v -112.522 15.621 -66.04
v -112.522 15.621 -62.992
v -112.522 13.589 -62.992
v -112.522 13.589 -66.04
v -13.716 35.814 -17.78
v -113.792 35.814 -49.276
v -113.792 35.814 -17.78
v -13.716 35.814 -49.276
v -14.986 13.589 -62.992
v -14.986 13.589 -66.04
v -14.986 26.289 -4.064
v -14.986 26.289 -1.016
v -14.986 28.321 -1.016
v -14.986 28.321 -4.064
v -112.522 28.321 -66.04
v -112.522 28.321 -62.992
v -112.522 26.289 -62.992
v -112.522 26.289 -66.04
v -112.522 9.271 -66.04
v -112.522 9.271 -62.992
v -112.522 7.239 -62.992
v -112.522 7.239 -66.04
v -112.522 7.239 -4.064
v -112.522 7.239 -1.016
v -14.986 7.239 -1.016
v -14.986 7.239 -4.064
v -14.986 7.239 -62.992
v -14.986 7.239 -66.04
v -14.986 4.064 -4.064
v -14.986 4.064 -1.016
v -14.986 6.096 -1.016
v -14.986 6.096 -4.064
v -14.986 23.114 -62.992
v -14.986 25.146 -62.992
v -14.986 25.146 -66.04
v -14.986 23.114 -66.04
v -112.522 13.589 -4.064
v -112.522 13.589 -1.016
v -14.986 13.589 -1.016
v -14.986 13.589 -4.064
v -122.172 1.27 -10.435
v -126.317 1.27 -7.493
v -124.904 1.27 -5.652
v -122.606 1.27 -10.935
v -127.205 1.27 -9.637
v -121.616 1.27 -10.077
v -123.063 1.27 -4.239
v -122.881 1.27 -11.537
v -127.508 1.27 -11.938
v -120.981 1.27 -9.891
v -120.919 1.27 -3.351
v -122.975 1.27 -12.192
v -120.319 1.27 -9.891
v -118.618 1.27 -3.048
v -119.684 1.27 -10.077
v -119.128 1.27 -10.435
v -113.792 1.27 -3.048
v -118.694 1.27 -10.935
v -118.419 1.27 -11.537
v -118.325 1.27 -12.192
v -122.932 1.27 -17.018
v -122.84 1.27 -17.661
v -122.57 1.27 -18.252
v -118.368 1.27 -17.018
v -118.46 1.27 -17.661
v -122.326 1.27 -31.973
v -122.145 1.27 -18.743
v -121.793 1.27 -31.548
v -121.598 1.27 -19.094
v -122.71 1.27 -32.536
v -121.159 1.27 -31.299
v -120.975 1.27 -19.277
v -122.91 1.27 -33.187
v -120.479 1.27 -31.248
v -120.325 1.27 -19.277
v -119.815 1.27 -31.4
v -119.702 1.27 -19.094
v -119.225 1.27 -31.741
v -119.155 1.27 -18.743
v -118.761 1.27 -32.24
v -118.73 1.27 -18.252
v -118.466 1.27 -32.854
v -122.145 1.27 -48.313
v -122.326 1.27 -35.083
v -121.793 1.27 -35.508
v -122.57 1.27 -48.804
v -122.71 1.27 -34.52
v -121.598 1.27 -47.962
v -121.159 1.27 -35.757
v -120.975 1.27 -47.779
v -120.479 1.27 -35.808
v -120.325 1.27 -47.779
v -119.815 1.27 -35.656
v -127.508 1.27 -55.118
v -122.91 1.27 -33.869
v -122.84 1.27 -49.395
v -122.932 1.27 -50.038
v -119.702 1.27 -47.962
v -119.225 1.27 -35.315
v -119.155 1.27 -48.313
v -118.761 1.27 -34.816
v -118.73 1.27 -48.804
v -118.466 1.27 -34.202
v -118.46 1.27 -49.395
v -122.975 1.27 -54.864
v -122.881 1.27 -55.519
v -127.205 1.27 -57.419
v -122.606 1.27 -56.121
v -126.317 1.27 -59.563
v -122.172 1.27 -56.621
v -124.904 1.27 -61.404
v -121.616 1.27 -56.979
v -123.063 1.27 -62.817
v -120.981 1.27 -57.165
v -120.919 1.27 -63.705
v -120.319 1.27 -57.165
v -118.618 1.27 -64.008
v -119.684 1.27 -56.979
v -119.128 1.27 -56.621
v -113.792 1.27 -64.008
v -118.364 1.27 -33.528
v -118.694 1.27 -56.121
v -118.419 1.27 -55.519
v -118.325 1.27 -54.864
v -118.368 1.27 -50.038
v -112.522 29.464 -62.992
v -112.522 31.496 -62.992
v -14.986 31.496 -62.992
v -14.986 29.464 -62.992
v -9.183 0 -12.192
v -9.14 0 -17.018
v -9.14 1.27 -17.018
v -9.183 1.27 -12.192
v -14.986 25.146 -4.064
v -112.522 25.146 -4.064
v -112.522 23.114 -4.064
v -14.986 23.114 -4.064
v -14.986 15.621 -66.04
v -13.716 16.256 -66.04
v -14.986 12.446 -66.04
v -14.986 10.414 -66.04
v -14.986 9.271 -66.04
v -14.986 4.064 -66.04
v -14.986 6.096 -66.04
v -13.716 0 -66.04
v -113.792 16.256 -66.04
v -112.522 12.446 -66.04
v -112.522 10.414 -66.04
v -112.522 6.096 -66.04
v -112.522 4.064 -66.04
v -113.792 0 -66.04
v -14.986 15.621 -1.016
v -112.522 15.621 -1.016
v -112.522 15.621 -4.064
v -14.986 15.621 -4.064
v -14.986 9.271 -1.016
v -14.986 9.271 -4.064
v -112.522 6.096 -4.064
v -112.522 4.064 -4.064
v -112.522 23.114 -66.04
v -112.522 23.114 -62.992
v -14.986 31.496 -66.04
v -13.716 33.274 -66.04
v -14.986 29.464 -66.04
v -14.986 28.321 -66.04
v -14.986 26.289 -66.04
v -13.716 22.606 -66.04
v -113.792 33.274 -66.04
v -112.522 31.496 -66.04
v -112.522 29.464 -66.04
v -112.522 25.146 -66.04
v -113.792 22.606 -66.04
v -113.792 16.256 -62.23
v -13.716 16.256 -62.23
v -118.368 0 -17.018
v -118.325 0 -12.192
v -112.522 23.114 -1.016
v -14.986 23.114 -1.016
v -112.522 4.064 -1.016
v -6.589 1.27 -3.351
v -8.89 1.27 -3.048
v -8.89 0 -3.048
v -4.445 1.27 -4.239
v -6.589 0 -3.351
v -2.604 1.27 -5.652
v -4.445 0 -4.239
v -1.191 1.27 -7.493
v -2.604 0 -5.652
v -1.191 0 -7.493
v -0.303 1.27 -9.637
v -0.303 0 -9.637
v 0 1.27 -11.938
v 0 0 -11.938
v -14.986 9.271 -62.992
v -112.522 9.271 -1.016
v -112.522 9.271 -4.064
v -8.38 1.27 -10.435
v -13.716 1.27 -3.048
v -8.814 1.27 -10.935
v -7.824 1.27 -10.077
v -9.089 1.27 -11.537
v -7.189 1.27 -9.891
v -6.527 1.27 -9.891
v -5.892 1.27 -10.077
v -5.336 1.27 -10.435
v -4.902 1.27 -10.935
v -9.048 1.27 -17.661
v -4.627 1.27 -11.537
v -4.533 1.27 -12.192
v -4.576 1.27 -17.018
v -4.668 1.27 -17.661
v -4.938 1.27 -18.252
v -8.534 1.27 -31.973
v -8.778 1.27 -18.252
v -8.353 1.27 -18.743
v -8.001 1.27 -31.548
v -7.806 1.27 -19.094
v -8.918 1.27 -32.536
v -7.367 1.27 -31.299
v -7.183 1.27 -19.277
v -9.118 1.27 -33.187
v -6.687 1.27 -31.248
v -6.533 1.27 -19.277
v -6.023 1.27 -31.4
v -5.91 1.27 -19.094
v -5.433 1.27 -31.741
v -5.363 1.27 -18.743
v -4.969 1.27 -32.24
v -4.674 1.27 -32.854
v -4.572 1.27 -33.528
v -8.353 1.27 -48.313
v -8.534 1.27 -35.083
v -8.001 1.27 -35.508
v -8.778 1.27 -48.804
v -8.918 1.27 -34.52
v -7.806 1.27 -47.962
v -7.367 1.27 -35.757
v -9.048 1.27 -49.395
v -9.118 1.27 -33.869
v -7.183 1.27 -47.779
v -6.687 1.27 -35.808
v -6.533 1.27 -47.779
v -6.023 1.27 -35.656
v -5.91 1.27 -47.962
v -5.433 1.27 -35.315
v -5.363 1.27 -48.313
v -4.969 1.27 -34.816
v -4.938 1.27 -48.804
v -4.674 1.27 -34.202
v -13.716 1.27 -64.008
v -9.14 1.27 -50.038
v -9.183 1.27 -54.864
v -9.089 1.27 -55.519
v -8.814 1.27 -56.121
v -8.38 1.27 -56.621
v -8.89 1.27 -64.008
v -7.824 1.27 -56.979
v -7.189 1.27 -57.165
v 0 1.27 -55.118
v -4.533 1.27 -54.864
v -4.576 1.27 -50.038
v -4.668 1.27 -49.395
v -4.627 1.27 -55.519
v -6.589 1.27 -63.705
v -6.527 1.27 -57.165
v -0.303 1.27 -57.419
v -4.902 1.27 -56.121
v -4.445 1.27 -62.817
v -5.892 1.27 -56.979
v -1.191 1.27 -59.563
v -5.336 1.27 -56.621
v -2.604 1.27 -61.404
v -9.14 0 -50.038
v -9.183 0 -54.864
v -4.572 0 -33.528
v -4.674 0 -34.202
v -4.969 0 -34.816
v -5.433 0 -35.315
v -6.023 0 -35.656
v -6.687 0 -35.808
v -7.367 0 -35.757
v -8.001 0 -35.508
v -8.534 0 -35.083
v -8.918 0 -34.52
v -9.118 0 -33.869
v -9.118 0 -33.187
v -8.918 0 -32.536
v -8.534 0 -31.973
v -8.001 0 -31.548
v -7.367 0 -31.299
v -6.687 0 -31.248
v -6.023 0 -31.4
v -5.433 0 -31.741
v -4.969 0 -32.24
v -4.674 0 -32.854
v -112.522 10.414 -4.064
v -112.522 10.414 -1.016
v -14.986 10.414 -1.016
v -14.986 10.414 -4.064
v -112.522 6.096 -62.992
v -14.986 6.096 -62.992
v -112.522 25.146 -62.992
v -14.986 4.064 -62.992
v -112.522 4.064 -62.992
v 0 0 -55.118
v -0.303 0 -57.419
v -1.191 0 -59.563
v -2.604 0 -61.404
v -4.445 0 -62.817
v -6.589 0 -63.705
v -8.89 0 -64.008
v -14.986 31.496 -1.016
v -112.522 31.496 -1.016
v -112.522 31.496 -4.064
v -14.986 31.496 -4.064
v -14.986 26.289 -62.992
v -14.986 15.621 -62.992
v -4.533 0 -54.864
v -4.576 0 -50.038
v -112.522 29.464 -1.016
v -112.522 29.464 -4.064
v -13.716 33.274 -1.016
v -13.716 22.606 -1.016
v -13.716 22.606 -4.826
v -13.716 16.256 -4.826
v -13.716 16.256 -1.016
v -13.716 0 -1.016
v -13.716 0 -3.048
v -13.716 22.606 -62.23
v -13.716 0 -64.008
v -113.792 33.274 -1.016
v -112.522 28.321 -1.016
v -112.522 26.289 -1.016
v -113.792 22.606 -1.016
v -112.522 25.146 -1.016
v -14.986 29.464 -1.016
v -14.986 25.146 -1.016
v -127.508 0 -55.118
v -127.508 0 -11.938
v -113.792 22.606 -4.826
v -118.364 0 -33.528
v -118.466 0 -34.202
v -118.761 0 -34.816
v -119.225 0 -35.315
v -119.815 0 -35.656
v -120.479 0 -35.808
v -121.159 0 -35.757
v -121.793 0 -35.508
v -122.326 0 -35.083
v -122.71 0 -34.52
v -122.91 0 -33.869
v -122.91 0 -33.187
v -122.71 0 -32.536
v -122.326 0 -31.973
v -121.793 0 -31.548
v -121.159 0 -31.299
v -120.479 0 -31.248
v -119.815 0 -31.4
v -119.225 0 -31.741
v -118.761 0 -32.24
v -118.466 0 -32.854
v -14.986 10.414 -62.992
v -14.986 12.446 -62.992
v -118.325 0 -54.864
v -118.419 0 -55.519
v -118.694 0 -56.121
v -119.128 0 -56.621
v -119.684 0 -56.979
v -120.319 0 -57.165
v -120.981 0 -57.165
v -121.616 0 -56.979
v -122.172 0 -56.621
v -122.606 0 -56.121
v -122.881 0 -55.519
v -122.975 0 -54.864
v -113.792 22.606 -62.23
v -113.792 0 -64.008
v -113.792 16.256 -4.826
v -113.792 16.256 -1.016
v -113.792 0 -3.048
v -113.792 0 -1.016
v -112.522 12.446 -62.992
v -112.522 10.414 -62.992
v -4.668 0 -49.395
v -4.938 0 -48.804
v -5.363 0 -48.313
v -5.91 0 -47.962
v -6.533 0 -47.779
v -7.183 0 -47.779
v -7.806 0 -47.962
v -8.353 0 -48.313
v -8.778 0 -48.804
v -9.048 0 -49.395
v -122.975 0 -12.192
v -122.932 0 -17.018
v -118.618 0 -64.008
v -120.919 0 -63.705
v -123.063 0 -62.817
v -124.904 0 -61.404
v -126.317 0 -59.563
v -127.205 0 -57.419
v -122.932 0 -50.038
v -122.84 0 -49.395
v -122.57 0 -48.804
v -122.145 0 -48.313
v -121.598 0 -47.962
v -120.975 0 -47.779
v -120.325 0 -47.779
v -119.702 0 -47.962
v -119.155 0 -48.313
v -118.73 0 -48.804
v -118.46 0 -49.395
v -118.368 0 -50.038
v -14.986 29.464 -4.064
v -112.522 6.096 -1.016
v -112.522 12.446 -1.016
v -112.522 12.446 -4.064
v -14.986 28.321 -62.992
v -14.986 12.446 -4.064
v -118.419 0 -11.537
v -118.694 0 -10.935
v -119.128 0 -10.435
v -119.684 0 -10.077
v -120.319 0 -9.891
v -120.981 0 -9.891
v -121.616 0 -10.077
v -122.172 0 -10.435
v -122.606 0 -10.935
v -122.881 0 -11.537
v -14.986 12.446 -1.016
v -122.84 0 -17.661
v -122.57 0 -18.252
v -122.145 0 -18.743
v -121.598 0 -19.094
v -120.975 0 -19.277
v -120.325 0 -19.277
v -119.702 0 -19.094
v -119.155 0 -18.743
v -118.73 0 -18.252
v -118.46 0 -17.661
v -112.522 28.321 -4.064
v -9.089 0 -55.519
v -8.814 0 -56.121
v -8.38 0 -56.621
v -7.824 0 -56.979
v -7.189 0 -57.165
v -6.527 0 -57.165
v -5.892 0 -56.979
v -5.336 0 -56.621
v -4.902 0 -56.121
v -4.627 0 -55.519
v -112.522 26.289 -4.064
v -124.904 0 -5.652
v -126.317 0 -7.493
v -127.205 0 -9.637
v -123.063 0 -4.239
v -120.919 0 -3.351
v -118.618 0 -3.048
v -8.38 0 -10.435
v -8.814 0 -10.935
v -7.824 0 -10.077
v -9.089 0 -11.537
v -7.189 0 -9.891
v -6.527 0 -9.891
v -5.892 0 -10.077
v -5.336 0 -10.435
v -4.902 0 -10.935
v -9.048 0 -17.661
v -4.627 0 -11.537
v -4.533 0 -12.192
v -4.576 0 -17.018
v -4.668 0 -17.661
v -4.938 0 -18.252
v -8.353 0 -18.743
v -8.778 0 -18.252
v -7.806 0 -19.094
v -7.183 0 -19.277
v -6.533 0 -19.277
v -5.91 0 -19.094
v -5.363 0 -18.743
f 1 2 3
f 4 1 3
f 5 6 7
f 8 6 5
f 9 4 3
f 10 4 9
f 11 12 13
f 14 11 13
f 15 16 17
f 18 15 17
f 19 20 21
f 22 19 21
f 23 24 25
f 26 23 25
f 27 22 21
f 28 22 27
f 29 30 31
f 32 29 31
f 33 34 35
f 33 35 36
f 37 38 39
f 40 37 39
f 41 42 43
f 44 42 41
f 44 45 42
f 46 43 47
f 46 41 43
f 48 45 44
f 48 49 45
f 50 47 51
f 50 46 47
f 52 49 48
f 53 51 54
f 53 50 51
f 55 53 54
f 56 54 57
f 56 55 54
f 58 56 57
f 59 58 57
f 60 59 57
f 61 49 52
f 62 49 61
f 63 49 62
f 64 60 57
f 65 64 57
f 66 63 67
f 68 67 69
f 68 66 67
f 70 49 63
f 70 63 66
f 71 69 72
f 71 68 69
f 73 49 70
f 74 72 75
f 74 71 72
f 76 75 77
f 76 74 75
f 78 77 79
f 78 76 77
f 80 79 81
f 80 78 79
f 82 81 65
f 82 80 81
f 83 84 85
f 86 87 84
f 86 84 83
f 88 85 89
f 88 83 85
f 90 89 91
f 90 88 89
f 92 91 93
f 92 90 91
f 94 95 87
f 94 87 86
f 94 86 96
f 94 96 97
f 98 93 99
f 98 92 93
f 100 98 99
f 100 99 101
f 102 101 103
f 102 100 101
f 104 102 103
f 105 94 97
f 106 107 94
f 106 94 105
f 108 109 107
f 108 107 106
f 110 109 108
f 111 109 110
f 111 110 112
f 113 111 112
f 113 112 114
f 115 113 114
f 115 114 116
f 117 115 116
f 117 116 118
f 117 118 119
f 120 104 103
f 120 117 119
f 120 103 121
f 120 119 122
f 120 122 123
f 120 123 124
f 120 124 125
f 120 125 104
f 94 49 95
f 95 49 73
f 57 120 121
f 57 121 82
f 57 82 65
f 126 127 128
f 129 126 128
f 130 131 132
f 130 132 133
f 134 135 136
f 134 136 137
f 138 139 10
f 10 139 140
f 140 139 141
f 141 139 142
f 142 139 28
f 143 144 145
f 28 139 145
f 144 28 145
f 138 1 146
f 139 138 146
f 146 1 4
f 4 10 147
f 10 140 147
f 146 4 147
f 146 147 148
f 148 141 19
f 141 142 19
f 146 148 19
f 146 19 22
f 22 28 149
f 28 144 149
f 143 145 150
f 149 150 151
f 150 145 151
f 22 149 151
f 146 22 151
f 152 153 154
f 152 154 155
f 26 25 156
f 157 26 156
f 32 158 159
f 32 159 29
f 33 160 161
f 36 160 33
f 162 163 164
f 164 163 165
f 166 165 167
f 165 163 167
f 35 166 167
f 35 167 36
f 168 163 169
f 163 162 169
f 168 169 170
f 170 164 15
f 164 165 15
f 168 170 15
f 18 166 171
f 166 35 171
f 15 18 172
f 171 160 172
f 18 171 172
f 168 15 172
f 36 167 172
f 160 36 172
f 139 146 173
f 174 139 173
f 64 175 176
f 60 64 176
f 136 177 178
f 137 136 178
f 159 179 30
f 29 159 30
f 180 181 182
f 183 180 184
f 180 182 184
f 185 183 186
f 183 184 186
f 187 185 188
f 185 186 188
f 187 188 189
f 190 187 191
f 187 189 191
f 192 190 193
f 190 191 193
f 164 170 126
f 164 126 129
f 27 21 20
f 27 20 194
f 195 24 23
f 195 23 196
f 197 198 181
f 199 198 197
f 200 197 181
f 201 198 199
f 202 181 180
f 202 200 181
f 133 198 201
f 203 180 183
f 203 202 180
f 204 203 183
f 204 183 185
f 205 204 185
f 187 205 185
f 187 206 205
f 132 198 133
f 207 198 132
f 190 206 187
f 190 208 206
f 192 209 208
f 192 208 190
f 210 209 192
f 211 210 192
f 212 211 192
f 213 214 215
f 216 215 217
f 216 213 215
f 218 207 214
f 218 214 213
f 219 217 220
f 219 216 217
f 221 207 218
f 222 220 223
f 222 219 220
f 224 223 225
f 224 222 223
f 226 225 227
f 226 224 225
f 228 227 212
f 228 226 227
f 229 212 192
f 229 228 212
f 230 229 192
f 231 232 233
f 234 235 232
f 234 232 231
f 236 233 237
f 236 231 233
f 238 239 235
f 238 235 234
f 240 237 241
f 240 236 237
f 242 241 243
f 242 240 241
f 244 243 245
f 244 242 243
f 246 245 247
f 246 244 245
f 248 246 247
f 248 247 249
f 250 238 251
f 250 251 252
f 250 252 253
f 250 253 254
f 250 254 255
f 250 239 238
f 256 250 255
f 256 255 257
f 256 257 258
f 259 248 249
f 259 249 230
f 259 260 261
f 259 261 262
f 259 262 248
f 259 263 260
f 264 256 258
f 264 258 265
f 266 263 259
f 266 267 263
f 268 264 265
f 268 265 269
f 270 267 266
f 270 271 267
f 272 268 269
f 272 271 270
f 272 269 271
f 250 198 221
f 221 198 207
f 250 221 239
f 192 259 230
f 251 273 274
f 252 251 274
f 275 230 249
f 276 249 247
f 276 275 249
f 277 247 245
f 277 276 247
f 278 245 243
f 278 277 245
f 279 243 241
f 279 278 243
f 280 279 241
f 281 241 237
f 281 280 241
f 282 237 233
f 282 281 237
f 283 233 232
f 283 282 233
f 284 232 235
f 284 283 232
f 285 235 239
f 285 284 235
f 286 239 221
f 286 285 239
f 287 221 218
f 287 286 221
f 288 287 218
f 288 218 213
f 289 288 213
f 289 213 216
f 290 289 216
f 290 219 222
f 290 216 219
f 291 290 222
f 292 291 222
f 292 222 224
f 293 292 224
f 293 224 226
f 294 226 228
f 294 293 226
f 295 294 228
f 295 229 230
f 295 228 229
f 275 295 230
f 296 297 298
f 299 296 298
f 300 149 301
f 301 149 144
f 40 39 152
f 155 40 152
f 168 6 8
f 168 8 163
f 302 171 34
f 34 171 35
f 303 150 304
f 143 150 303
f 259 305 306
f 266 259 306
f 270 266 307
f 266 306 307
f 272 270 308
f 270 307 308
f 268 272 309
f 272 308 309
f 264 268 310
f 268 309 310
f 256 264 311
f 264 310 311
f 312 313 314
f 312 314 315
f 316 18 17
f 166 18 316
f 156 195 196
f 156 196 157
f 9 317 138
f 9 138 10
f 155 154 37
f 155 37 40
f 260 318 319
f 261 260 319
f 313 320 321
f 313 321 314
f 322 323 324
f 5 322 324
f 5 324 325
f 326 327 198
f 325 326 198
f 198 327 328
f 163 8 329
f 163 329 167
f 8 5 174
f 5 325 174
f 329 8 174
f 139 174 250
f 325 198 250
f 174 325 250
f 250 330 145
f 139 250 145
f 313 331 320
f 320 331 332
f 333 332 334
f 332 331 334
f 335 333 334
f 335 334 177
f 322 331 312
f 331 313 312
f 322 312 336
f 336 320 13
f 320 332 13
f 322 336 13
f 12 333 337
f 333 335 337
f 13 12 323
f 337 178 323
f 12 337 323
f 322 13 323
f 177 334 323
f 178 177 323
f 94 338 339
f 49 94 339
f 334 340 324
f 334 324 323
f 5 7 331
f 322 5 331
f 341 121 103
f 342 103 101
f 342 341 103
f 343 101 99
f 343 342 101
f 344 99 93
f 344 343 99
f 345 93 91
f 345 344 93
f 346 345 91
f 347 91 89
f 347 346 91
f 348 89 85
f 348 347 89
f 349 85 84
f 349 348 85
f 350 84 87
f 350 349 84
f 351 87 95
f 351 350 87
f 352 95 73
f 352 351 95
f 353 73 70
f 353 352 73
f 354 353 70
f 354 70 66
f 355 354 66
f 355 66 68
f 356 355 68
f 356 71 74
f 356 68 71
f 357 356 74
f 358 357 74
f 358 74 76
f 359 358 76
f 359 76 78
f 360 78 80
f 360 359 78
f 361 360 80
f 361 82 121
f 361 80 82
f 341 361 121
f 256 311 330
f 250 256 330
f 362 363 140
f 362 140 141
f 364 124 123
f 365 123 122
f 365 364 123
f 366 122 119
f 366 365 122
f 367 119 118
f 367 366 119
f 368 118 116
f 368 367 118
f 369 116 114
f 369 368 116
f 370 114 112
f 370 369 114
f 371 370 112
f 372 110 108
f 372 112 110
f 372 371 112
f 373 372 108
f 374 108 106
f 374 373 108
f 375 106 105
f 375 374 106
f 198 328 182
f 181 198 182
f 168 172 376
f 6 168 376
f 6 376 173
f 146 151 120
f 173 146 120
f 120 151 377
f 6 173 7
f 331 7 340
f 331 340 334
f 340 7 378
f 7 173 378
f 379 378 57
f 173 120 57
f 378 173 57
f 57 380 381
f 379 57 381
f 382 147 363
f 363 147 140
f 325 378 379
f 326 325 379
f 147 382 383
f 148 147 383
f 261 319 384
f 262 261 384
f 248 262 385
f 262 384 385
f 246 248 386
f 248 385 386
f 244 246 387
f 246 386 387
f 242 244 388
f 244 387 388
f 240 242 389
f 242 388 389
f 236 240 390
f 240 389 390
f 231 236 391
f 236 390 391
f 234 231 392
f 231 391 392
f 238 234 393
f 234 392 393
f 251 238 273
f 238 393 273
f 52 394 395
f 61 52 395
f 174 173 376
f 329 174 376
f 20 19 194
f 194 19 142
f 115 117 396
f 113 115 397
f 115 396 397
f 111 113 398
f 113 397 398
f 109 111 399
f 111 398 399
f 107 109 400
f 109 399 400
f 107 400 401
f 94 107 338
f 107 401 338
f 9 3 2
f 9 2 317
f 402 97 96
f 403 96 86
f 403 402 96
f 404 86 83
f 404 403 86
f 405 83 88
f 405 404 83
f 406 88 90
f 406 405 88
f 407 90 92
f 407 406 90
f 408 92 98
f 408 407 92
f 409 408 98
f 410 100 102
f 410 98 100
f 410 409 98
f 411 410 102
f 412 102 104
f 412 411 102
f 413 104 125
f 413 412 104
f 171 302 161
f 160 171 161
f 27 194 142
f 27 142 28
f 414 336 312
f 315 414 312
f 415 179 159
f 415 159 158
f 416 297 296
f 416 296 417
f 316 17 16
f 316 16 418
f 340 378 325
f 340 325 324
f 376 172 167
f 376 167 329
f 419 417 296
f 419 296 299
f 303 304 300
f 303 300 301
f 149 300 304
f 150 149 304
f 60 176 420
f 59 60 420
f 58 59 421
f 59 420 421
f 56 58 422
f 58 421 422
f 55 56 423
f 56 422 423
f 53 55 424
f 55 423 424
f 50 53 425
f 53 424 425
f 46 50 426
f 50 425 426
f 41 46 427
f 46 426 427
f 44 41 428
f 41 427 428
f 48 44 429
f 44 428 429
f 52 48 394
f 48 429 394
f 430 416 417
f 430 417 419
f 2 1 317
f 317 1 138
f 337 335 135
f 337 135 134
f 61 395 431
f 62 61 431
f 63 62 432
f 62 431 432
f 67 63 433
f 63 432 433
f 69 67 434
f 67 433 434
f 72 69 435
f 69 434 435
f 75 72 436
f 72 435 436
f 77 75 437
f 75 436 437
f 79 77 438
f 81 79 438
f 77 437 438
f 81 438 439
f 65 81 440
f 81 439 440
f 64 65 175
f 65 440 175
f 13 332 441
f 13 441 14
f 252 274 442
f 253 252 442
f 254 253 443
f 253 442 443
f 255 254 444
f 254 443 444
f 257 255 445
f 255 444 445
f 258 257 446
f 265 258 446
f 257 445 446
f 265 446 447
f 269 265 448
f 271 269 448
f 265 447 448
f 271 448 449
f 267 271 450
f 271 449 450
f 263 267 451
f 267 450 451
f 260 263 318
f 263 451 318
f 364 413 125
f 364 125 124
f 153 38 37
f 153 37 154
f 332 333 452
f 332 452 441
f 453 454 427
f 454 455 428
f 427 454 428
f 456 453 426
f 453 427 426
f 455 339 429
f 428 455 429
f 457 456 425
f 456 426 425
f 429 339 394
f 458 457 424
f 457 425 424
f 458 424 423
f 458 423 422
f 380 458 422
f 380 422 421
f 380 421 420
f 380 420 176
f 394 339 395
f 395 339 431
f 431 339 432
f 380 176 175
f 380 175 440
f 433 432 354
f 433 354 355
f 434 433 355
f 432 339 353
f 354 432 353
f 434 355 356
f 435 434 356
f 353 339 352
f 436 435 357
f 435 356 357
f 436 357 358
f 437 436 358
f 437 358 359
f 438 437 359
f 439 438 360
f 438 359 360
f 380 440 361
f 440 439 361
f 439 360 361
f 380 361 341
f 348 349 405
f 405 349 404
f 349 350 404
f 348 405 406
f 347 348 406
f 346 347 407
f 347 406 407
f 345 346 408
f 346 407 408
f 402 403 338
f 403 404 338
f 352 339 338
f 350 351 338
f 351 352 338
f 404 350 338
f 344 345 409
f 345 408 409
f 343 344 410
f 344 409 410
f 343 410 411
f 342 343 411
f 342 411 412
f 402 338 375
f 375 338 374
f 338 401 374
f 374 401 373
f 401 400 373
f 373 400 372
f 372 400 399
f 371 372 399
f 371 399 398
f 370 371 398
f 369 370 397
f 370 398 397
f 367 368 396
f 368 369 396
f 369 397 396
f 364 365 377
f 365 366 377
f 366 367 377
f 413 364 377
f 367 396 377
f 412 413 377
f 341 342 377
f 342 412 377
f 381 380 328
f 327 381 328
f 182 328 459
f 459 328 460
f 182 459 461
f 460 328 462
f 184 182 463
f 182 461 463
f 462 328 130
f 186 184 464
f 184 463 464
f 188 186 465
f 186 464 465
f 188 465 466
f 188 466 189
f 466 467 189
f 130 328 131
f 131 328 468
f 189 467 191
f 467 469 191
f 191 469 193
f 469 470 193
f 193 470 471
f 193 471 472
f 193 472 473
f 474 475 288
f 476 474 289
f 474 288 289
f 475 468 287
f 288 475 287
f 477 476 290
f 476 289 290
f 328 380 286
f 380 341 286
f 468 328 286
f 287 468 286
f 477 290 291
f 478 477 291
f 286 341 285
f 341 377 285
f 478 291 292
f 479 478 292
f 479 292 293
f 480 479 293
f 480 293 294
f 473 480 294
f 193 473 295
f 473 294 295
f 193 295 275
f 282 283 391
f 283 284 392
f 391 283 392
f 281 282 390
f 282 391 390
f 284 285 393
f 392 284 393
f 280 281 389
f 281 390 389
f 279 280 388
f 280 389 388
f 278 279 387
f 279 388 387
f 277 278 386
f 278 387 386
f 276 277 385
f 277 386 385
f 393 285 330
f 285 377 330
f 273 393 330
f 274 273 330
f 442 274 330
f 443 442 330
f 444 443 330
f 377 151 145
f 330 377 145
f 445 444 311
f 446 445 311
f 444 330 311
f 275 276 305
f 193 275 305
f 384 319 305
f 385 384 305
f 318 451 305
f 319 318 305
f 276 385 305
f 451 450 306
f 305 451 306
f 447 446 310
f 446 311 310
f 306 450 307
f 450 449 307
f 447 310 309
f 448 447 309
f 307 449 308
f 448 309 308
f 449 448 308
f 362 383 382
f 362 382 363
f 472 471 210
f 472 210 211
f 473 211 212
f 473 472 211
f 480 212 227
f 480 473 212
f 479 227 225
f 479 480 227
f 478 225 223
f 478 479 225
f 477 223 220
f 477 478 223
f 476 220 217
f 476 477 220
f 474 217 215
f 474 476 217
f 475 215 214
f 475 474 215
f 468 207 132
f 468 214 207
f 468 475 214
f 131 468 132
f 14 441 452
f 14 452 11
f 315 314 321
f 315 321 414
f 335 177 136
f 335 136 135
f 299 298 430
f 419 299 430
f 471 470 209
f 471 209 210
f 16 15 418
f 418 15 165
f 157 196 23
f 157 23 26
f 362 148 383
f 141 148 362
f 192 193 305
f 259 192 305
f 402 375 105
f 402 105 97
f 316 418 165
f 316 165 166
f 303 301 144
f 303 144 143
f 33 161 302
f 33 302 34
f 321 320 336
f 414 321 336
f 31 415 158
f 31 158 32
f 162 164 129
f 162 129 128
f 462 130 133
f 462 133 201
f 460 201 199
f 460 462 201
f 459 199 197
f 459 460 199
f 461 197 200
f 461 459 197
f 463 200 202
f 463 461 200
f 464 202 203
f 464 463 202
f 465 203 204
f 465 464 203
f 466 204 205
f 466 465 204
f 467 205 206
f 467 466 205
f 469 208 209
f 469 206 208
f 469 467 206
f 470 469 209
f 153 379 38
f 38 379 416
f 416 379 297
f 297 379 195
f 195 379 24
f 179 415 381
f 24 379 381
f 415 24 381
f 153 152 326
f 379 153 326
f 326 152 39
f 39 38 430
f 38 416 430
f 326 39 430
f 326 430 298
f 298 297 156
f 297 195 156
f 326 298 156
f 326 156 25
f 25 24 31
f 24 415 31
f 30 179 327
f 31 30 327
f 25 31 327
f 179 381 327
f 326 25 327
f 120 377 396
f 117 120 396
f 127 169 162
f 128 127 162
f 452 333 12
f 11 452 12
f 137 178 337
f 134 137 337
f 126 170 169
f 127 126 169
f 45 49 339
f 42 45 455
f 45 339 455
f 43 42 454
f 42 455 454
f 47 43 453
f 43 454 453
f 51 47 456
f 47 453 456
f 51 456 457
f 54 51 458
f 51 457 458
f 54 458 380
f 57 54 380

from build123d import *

# Parameters (mm, degrees)
SKETCH1_R               = 2.286
BOSS_EXTRUDE1_DEPTH     = 35.814
SKETCH3_W               = 13.716
SKETCH3_H               = 60.96
CUT_EXTRUDE2_DEPTH      = 34.544
SKETCH4_W               = 3.81
SKETCH4_H               = 6.35
CUT_EXTRUDE3_DEPTH      = 114.792
SKETCH5_W               = 97.536
SKETCH5_H               = 2.032
CUT_EXTRUDE6_DEPTH      = 3.048
LPATTERN1_COUNT         = 9
LPATTERN1_PITCH         = 3.175
MIRROR1_COPY_1_SKETCH_W = 97.536
MIRROR1_COPY_1_SKETCH_H = 2.032
MIRROR1_COPY_1_DEPTH    = 3.048
MIRROR1_COPY_2_SKETCH_W = 97.536
MIRROR1_COPY_2_SKETCH_H = 2.032
MIRROR1_COPY_2_DEPTH    = 3.048
MIRROR1_COPY_3_SKETCH_W = 97.536
MIRROR1_COPY_3_SKETCH_H = 2.032
MIRROR1_COPY_3_DEPTH    = 3.048
MIRROR1_COPY_4_SKETCH_W = 97.536
MIRROR1_COPY_4_SKETCH_H = 2.032
MIRROR1_COPY_4_DEPTH    = 3.048
MIRROR1_COPY_5_SKETCH_W = 97.536
MIRROR1_COPY_5_SKETCH_H = 2.032
MIRROR1_COPY_5_DEPTH    = 3.048
MIRROR1_COPY_6_SKETCH_W = 97.536
MIRROR1_COPY_6_SKETCH_H = 2.032
MIRROR1_COPY_6_DEPTH    = 3.048


with BuildPart() as part:
    # Sketch1 → Boss-Extrude1 (new body)
    with BuildSketch(Plane(origin=(0, 0, 0), x_dir=(1, 0, 0), z_dir=(0, 1, 0))):
        with BuildLine():
            Line((0, 11.938), (0, 55.118))
            ThreePointArc((0, 55.118), (-2.603820715, 61.404179285), (-8.89, 64.008))
            Line((-8.89, 64.008), (-13.716, 64.008))
            Line((-13.716, 64.008), (-13.716, 66.04))
            Line((-13.716, 66.04), (-113.792, 66.04))
            Line((-113.792, 66.04), (-113.792, 64.008))
            Line((-113.792, 64.008), (-118.618, 64.008))
            ThreePointArc((-118.618, 64.008), (-124.904179285, 61.404179285), (-127.508, 55.118))
            Line((-127.508, 55.118), (-127.508, 11.938))
            ThreePointArc((-127.508, 11.938), (-124.904179285, 5.651820715), (-118.618, 3.048))
            Line((-118.618, 3.048), (-113.792, 3.048))
            Line((-113.792, 3.048), (-113.792, 1.016))
            Line((-113.792, 1.016), (-13.716, 1.016))
            Line((-13.716, 1.016), (-13.716, 3.048))
            Line((-13.716, 3.048), (-8.89, 3.048))
            ThreePointArc((-8.89, 3.048), (-2.603820715, 5.651820715), (0, 11.938))
        make_face()
        with Locations((-120.65, 33.528)):
            Circle(SKETCH1_R, mode=Mode.SUBTRACT)
        with Locations((-6.858, 33.528)):
            Circle(SKETCH1_R, mode=Mode.SUBTRACT)
        with BuildLine():
            Line((-118.367709413, 17.018), (-118.325280939, 12.192))
            ThreePointArc((-118.325280939, 12.192), (-120.65, 9.867280939), (-122.974719061, 12.192))
            Line((-122.974719061, 12.192), (-122.932290587, 17.018))
            ThreePointArc((-122.932290587, 17.018), (-120.65, 19.300290587), (-118.367709413, 17.018))
        make_face(mode=Mode.SUBTRACT)
        with BuildLine():
            Line((-122.974719061, 54.864), (-122.932290587, 50.038))
            ThreePointArc((-122.932290587, 50.038), (-120.65, 47.755709413), (-118.367709413, 50.038))
            Line((-118.367709413, 50.038), (-118.325280939, 54.864))
            ThreePointArc((-118.325280939, 54.864), (-120.65, 57.188719061), (-122.974719061, 54.864))
        make_face(mode=Mode.SUBTRACT)
        with BuildLine():
            Line((-9.140290587, 50.038), (-9.182719061, 54.864))
            ThreePointArc((-9.182719061, 54.864), (-6.858, 57.188719061), (-4.533280939, 54.864))
            Line((-4.533280939, 54.864), (-4.575709413, 50.038))
            ThreePointArc((-4.575709413, 50.038), (-6.858, 47.755709413), (-9.140290587, 50.038))
        make_face(mode=Mode.SUBTRACT)
        with BuildLine():
            Line((-4.533280939, 12.192), (-4.575709413, 17.018))
            ThreePointArc((-4.575709413, 17.018), (-6.858, 19.300290587), (-9.140290587, 17.018))
            Line((-9.140290587, 17.018), (-9.182719061, 12.192))
            ThreePointArc((-9.182719061, 12.192), (-6.858, 9.867280939), (-4.533280939, 12.192))
        make_face(mode=Mode.SUBTRACT)
    extrude(amount=BOSS_EXTRUDE1_DEPTH)

    # Sketch3 → Cut-Extrude2 (cut)
    with BuildSketch(Plane(origin=(0, 35.814, 0), x_dir=(1, 0, 0), z_dir=(0, 1, 0))):
        with Locations((-6.858, 33.528)):
            Rectangle(SKETCH3_W, SKETCH3_H)
        with Locations((-120.65, 33.528)):
            Rectangle(SKETCH3_W, SKETCH3_H)
    extrude(amount=-CUT_EXTRUDE2_DEPTH, mode=Mode.SUBTRACT)

    # Sketch4 → Cut-Extrude3 (cut, through all)
    with BuildSketch(Plane.ZY.offset(113.792)):
        Polygon((-17.78, 35.814), (-1.016, 33.274), (-1.016, 35.814), align=None)
        with Locations((-64.135, 19.431)):
            Rectangle(SKETCH4_W, SKETCH4_H)
        with Locations((-2.921, 19.431)):
            Rectangle(SKETCH4_W, SKETCH4_H)
        Polygon((-66.04, 33.274), (-66.04, 35.814), (-49.276, 35.814), align=None)
    extrude(amount=-CUT_EXTRUDE3_DEPTH, mode=Mode.SUBTRACT)

    # Sketch5 → Cut-Extrude6 (cut)
    with BuildSketch(Plane.XY.offset(-1.016)):
        with Locations((-63.754, 30.48)):
            Rectangle(SKETCH5_W, SKETCH5_H)
    cut_extrude6 = extrude(amount=-CUT_EXTRUDE6_DEPTH, mode=Mode.SUBTRACT)

    # LPattern1: Cut-Extrude6 ×9, 2 skipped
    with Locations(*[(0, -i * LPATTERN1_PITCH, 0) for i in range(1, LPATTERN1_COUNT) if i not in (3, 4)]):
        add(cut_extrude6, mode=Mode.SUBTRACT)

    # Mirror1: Cut-Extrude6 across plane
    add(cut_extrude6.mirror(Plane.XY.offset(-33.528)), mode=Mode.SUBTRACT)

    # Mirror1 copy 1 sketch → Mirror1 copy 1 (cut)
    with BuildSketch(Plane(origin=(0, -3.175, -66.04), x_dir=(1, 0, 0), z_dir=(0, 0, -1))):
        with Locations((-63.754, -30.48)):
            Rectangle(MIRROR1_COPY_1_SKETCH_W, MIRROR1_COPY_1_SKETCH_H)
    extrude(amount=-MIRROR1_COPY_1_DEPTH, mode=Mode.SUBTRACT)

    # Mirror1 copy 2 sketch → Mirror1 copy 2 (cut)
    with BuildSketch(Plane(origin=(0, -6.35, -66.04), x_dir=(1, 0, 0), z_dir=(0, 0, -1))):
        with Locations((-63.754, -30.48)):
            Rectangle(MIRROR1_COPY_2_SKETCH_W, MIRROR1_COPY_2_SKETCH_H)
    extrude(amount=-MIRROR1_COPY_2_DEPTH, mode=Mode.SUBTRACT)

    # Mirror1 copy 3 sketch → Mirror1 copy 3 (cut)
    with BuildSketch(Plane(origin=(0, -15.875, -66.04), x_dir=(1, 0, 0), z_dir=(0, 0, -1))):
        with Locations((-63.754, -30.48)):
            Rectangle(MIRROR1_COPY_3_SKETCH_W, MIRROR1_COPY_3_SKETCH_H)
    extrude(amount=-MIRROR1_COPY_3_DEPTH, mode=Mode.SUBTRACT)

    # Mirror1 copy 4 sketch → Mirror1 copy 4 (cut)
    with BuildSketch(Plane(origin=(0, -19.05, -66.04), x_dir=(1, 0, 0), z_dir=(0, 0, -1))):
        with Locations((-63.754, -30.48)):
            Rectangle(MIRROR1_COPY_4_SKETCH_W, MIRROR1_COPY_4_SKETCH_H)
    extrude(amount=-MIRROR1_COPY_4_DEPTH, mode=Mode.SUBTRACT)

    # Mirror1 copy 5 sketch → Mirror1 copy 5 (cut)
    with BuildSketch(Plane(origin=(0, -22.225, -66.04), x_dir=(1, 0, 0), z_dir=(0, 0, -1))):
        with Locations((-63.754, -30.48)):
            Rectangle(MIRROR1_COPY_5_SKETCH_W, MIRROR1_COPY_5_SKETCH_H)
    extrude(amount=-MIRROR1_COPY_5_DEPTH, mode=Mode.SUBTRACT)

    # Mirror1 copy 6 sketch → Mirror1 copy 6 (cut)
    with BuildSketch(Plane(origin=(0, -25.4, -66.04), x_dir=(1, 0, 0), z_dir=(0, 0, -1))):
        with Locations((-63.754, -30.48)):
            Rectangle(MIRROR1_COPY_6_SKETCH_W, MIRROR1_COPY_6_SKETCH_H)
    extrude(amount=-MIRROR1_COPY_6_DEPTH, mode=Mode.SUBTRACT)


solid = part.part
